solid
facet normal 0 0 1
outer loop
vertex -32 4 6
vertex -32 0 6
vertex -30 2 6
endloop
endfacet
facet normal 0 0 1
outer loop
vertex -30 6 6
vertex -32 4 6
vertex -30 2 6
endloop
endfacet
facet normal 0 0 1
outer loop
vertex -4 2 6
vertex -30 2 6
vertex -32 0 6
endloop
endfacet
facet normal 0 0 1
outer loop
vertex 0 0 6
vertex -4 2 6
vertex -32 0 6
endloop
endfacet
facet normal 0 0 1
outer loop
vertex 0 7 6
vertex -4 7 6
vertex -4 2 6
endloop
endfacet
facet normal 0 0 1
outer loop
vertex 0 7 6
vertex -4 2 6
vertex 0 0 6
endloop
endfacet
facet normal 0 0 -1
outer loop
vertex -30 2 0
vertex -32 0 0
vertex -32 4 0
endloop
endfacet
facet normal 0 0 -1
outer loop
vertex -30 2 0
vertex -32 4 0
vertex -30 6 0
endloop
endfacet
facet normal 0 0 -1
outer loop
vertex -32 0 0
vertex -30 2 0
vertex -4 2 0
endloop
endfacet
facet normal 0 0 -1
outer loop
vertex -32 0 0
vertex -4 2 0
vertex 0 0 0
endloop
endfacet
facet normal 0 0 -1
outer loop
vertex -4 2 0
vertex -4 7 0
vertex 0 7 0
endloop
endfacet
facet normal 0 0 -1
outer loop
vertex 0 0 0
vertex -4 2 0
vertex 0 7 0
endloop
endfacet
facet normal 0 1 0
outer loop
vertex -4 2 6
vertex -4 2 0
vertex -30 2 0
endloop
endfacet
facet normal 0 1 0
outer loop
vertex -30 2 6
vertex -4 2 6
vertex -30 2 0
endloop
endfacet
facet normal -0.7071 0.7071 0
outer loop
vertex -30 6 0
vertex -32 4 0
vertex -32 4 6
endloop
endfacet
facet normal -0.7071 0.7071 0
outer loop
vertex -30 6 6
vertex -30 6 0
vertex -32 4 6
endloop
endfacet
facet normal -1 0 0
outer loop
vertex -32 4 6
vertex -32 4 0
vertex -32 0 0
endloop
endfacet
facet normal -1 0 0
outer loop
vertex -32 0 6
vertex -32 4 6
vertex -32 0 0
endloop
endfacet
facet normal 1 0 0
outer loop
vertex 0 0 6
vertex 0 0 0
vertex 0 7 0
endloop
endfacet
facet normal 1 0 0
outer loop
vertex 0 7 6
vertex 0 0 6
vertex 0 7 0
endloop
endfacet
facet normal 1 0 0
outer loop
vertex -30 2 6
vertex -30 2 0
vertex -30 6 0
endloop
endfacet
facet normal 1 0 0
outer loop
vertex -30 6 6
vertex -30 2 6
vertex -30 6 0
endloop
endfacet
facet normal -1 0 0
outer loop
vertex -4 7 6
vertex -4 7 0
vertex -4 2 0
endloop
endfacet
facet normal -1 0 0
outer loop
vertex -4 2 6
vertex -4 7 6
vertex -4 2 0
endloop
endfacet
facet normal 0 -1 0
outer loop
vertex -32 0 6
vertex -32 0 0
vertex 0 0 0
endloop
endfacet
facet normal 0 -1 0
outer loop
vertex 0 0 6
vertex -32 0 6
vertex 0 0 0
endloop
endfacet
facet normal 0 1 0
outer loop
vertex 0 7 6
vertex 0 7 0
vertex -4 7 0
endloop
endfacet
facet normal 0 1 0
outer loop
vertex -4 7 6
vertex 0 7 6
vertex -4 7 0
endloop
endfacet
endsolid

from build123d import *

# Parameters (mm, degrees)
F1_DEPTH = 6
F2_SIZE  = 1.99999


# Not quite as in the source:
# - a fillet or chamfer is up to 0.001 mm smaller than in the source, because OpenCascade refuses the exact size


with BuildPart() as f1:
    # F0 (on Top) → F1 (new body)
    with BuildSketch(Plane.XY):
        Polygon((-4, 7), (-4, 2), (-30, 2), (-30, 6), (-32, 6), (-32, 0), (0, 0), (0, 7), align=None)
    extrude(amount=F1_DEPTH)

    # F2 (size 2 in the source; OpenCascade refuses exactly that, so slightly less here)
    f2_edges = [f1.edges().sort_by_distance(p)[0] for p in [
        (-32, 6, 3),
    ]]
    chamfer(f2_edges, length=F2_SIZE)


solid = f1.part
